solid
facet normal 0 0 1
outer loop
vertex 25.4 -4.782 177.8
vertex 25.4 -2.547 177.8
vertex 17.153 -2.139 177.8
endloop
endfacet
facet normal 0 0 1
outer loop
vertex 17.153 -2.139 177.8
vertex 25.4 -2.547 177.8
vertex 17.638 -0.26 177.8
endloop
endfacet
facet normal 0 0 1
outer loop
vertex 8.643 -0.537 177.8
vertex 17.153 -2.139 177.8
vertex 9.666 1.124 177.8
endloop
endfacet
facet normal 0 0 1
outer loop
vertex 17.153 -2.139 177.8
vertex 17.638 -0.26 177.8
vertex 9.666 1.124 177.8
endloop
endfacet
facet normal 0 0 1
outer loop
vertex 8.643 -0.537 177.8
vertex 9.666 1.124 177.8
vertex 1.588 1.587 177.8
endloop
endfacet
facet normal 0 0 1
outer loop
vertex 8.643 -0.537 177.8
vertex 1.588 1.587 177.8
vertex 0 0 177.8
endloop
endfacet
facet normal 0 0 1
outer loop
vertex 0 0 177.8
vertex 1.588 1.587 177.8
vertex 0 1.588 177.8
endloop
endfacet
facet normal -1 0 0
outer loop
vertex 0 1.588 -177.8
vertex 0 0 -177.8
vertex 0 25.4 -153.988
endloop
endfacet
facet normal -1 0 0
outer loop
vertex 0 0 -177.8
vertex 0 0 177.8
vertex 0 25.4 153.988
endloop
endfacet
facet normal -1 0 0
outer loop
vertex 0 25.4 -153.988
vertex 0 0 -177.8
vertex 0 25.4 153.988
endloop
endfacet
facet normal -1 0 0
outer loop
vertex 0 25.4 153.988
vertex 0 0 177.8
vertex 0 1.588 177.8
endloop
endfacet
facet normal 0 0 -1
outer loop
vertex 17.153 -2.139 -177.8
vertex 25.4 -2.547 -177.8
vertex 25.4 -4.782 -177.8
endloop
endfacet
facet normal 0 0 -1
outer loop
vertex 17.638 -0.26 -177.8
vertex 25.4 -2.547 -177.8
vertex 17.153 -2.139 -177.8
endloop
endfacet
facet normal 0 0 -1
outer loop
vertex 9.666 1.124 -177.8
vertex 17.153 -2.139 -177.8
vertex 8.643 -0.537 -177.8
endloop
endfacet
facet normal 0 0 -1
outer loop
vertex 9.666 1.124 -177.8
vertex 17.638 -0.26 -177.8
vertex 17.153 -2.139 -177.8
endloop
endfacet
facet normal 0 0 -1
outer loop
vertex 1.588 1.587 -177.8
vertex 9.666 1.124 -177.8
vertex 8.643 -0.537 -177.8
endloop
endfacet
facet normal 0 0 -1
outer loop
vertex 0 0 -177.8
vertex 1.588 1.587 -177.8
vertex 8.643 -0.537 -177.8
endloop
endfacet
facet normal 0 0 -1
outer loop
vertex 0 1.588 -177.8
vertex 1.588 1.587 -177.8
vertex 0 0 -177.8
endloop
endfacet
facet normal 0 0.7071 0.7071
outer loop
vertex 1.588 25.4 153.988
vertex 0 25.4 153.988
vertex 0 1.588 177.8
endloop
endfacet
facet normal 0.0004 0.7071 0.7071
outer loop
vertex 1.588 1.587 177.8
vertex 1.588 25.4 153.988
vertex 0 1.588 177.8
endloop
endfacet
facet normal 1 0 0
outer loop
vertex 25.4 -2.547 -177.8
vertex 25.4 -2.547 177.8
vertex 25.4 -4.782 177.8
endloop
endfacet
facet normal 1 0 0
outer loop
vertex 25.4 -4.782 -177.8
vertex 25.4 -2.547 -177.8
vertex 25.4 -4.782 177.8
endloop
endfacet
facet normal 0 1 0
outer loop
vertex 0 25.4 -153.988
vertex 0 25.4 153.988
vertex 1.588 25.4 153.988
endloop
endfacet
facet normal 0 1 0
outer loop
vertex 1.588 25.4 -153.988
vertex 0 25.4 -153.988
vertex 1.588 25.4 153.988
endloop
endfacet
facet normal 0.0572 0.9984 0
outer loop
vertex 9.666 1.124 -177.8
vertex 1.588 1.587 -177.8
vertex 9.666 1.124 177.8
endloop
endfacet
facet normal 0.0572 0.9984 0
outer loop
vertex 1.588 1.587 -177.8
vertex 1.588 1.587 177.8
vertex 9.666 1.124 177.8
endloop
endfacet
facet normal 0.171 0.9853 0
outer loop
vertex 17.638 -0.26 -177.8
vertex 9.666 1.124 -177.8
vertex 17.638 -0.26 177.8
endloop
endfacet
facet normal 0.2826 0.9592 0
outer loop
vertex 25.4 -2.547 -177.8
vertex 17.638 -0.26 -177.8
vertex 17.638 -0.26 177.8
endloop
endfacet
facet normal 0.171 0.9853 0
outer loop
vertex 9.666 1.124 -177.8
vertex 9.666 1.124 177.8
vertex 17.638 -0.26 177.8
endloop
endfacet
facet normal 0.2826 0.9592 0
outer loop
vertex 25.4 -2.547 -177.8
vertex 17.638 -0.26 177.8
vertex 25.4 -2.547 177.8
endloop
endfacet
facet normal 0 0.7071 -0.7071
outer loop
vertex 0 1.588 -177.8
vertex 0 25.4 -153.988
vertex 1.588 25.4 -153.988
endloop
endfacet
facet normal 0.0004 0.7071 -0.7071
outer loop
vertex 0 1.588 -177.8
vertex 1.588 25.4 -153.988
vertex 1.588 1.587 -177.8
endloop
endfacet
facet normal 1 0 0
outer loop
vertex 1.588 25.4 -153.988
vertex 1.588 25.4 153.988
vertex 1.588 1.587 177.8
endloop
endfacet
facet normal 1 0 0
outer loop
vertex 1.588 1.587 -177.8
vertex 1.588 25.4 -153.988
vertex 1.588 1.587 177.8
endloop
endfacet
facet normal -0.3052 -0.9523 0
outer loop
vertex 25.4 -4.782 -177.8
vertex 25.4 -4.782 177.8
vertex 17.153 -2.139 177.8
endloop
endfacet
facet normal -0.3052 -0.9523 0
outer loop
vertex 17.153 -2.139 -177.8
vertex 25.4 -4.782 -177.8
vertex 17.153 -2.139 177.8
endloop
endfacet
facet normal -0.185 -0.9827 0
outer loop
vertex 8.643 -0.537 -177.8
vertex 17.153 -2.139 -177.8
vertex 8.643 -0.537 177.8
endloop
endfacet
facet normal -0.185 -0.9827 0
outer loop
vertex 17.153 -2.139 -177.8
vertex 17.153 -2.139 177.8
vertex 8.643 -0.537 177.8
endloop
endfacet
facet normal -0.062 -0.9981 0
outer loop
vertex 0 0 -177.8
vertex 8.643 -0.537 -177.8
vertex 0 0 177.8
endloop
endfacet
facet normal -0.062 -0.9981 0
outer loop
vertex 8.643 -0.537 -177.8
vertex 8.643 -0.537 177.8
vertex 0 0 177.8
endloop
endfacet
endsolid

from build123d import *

# Parameters (mm, degrees)
EXTRUDE1_DEPTH = 177.8
EXTRUDE2_DEPTH = 387.35


with BuildPart() as part:
    # Sketch1 → Extrude1 (new, symmetric)
    with BuildSketch(Plane.XY):
        with BuildLine():
            Line((0, 0), (0, 25.4))
            Line((0, 25.4), (1.5875, 25.4))
            Line((1.5875, 25.4), (1.5875, 1.5875))
            ThreePointArc((1.5875, 1.5875), (13.671867582, 0.546246178), (25.4, -2.546820159))
            Line((25.4, -2.546820159), (25.4, -4.781862636))
            ThreePointArc((25.4, -4.781862636), (12.923101507, -1.205874633), (0, 0))
        make_face()
    extrude(amount=EXTRUDE1_DEPTH, both=True)

    # Sketch2 → Extrude2 (cut)
    with BuildSketch(Plane.ZY):
        Polygon((177.8, 25.4), (153.9875, 25.4), (177.8, 1.5875), align=None)
    extrude2 = extrude(amount=-EXTRUDE2_DEPTH, mode=Mode.SUBTRACT)

    # Mirror2: Extrude2 across plane
    add(extrude2.mirror(Plane(origin=(0, 0, 0), x_dir=(1, 0, 0), z_dir=(0, 0, -1))), mode=Mode.SUBTRACT)


solid = part.part
